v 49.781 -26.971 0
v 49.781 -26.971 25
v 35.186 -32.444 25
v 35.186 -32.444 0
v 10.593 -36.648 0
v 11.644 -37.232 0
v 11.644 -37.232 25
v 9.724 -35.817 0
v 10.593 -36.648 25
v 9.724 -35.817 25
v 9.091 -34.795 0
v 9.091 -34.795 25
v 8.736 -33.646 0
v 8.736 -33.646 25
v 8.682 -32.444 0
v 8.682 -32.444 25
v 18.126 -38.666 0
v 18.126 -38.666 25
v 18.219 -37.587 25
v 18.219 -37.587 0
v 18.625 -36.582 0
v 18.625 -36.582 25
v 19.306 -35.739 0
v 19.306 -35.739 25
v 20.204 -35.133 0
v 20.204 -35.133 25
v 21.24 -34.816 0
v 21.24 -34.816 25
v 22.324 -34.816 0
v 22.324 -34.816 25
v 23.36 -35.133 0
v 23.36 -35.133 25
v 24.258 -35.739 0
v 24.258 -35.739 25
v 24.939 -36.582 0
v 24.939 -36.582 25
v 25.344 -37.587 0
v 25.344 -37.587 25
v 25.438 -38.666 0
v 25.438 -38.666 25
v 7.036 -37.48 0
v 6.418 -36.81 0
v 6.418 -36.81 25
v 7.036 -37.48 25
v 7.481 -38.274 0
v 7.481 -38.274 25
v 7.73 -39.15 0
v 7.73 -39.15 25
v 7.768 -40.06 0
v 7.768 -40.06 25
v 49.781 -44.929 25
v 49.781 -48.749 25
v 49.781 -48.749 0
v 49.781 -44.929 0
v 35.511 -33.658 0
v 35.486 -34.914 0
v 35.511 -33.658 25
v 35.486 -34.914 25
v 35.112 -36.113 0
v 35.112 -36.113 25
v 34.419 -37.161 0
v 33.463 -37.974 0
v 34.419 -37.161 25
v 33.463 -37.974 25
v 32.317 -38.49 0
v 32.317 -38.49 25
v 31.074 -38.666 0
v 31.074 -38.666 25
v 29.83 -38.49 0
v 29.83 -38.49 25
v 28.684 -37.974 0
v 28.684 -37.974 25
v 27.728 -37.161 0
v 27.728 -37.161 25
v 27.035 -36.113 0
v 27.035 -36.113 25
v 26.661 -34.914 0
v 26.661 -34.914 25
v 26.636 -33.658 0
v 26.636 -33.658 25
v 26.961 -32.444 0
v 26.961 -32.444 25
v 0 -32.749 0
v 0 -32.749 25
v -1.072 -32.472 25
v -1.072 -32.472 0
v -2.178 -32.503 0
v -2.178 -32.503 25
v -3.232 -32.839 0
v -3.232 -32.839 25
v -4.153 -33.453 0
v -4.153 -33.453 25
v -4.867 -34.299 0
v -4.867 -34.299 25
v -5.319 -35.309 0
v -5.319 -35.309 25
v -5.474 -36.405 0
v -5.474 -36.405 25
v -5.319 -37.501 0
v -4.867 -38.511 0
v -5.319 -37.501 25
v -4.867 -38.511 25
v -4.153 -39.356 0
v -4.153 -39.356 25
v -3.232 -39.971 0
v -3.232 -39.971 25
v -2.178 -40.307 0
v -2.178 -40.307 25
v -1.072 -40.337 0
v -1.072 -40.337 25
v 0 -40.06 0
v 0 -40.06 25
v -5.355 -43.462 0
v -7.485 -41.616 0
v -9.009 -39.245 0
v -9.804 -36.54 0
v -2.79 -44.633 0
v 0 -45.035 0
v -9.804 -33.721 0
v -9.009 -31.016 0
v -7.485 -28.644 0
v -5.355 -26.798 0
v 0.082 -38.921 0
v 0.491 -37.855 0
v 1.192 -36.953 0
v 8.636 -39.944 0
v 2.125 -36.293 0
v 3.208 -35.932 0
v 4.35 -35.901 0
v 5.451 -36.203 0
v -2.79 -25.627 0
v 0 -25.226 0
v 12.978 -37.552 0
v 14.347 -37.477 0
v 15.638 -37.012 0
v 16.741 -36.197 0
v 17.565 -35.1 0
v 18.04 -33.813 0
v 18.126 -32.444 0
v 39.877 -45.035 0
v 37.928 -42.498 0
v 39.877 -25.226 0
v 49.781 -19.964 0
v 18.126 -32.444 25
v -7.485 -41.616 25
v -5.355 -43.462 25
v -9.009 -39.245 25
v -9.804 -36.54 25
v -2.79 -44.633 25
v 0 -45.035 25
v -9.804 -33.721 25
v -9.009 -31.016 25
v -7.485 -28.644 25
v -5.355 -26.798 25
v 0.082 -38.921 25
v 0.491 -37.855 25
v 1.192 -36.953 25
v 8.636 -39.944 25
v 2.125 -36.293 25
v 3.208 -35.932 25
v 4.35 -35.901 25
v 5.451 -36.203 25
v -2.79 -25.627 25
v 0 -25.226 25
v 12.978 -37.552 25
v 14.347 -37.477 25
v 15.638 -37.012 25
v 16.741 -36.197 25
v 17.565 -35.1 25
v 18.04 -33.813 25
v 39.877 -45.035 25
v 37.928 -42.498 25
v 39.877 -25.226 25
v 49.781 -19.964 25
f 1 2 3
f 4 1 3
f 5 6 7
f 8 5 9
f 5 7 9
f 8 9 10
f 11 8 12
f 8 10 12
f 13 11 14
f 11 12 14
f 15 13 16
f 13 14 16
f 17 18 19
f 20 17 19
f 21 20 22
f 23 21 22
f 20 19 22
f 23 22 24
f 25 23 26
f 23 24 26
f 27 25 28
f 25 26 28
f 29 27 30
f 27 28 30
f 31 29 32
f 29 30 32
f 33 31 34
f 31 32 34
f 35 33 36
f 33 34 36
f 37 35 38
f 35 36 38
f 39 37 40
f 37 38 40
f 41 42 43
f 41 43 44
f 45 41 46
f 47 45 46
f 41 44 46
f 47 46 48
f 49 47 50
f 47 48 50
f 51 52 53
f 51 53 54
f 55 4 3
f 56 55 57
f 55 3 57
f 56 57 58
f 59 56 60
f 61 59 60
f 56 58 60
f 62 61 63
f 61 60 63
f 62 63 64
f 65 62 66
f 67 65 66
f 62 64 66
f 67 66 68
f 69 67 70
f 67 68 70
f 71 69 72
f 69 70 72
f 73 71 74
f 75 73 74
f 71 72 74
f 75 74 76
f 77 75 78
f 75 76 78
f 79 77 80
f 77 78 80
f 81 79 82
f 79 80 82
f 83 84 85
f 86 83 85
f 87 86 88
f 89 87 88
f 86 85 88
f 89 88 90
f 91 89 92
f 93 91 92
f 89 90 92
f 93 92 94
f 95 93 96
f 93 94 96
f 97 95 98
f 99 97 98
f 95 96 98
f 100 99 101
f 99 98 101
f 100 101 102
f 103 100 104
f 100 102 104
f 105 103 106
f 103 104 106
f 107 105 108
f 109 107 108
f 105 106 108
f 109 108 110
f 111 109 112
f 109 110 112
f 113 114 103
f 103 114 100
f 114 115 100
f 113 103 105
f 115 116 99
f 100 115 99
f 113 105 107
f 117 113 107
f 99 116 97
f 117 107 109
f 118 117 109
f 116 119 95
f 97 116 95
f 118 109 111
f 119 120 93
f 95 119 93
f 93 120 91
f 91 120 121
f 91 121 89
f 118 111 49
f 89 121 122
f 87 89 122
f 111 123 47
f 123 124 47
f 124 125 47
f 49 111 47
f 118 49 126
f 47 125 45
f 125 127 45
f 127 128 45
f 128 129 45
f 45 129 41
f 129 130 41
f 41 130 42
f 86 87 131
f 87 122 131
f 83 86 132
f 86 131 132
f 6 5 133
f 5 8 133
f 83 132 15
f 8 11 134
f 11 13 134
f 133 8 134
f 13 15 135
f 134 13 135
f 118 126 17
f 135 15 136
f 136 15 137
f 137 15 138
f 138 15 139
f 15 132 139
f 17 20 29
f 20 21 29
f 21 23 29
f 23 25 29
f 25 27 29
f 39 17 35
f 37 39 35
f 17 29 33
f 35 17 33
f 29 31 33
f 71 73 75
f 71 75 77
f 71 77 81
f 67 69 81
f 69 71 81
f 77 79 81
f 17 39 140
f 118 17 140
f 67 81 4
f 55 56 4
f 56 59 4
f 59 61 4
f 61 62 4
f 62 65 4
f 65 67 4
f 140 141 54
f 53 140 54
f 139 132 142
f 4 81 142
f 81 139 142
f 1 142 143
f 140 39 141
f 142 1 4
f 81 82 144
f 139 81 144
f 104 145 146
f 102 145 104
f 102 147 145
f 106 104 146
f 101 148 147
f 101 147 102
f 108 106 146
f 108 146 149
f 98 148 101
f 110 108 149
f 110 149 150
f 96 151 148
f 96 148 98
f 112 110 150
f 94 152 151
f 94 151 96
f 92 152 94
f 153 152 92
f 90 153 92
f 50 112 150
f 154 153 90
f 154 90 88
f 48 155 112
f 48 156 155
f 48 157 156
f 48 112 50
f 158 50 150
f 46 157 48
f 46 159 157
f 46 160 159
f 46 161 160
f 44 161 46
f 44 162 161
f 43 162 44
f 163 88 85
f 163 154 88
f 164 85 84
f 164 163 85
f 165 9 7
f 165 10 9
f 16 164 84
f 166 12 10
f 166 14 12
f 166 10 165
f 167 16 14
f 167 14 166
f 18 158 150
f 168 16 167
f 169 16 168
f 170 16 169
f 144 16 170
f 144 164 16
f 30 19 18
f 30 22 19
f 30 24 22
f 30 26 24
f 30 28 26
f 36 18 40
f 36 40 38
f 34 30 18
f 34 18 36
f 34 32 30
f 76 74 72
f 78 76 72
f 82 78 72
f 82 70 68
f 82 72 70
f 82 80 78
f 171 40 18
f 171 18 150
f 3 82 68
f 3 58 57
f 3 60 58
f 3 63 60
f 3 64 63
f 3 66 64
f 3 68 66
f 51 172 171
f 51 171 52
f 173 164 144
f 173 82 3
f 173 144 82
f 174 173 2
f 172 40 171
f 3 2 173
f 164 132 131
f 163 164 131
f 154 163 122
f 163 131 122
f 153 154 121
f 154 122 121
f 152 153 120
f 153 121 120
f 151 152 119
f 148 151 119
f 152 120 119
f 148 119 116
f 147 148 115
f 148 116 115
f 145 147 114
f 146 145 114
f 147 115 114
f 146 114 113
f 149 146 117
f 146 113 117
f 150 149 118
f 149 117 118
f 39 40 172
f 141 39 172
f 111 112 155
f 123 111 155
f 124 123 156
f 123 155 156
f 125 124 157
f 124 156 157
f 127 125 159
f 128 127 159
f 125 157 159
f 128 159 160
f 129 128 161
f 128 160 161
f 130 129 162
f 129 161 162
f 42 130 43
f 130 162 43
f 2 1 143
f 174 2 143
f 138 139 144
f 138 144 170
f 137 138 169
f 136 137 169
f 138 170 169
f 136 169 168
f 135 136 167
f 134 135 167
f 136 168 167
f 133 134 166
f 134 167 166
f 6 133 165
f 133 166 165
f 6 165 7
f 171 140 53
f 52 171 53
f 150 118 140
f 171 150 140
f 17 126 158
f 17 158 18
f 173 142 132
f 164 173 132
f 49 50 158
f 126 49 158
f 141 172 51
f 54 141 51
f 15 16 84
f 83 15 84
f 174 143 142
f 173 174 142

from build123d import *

# Parameters (mm, degrees)
F1_DEPTH = 25
F4_DEPTH = 25
F5_DEPTH = 25


with BuildPart() as f1:
    # F0 (on Top) → F1 (new body)
    with BuildSketch(Plane.XY):
        with BuildLine():
            ThreePointArc((0, -25.2255909145), (-9.9045261741, -35.1301170886), (0, -45.0346432626))
            Line((0, -45.0346432626), (39.8768223822, -45.0346432626))
            Line((39.8768223822, -45.0346432626), (49.781344831, -48.7488396466))
            Line((49.781344831, -48.7488396466), (49.781344831, -19.9638102204))
            Line((49.781344831, -19.9638102204), (39.8768223822, -25.2255909145))
            Line((39.8768223822, -25.2255909145), (0, -25.2255909145))
        make_face()
    extrude(amount=F1_DEPTH)

    # F2 (on face) → F4 (join)
    with BuildSketch(Plane.XY.offset(25)):
        with BuildLine():
            Line((39.8768223822, -25.2255909145), (0, -25.2255909145))
            ThreePointArc((0, -25.2255909145), (-9.9045261741, -35.1301170886), (0, -45.0346432626))
            Line((0, -45.0346432626), (39.8768223822, -45.0346432626))
            Line((39.8768223822, -45.0346432626), (49.781344831, -48.7488396466))
            Line((49.781344831, -48.7488396466), (49.781344831, -19.9638102204))
            Line((49.781344831, -19.9638102204), (39.8768223822, -25.2255909145))
        make_face()
    extrude(amount=-F4_DEPTH)

    # F3 (on face) → F5 (cut)
    with BuildSketch(Plane.XY.offset(25)):
        with BuildLine():
            Line((8.6823031306, -32.4443913996), (0, -32.7490344644))
            ThreePointArc((0, -32.7490344644), (-5.4739792074, -36.4047400653), (0, -40.0604456663))
            ThreePointArc((0, -40.0604456663), (2.12452123, -36.2934819265), (6.4182874872, -36.8103741808))
            ThreePointArc((6.4182874872, -36.8103741808), (7.8913776241, -38.1191729594), (8.6357264586, -39.9436985434))
            Line((8.6357264586, -39.9436985434), (18.1262083352, -38.6662621896))
            ThreePointArc((18.1262083352, -38.6662621896), (21.7819157988, -34.7755161234), (25.4376232624, -38.6662621896))
            Line((25.4376232624, -38.6662621896), (37.927955389, -42.4975827336))
            Line((37.927955389, -42.4975827336), (49.781344831, -44.9290481875))
            Line((49.781344831, -44.9290481875), (49.781344831, -26.9712014124))
            Line((49.781344831, -26.9712014124), (35.1861715317, -32.4443913996))
            ThreePointArc((35.1861715317, -32.4443913996), (31.0735022649, -38.6662621896), (26.9608329982, -32.4443913996))
            Line((26.9608329982, -32.4443913996), (19.0401375294, -32.4443913996))
            ThreePointArc((19.0401375294, -32.4443913996), (16.6761777926, -36.8994118679), (11.6438215498, -37.2324338722))
            ThreePointArc((11.6438215498, -37.2324338722), (9.374780297, -35.3259838728), (8.6823031306, -32.4443913996))
        make_face()
        with BuildLine():
            ThreePointArc((8.6357264586, -39.9436985434), (7.8913776241, -38.1191729594), (6.4182874872, -36.8103741808))
            ThreePointArc((6.4182874872, -36.8103741808), (7.4813175027, -38.2742394866), (7.7683748677, -40.0604456663))
            Line((7.7683748677, -40.0604456663), (8.6357264586, -39.9436985434))
        make_face()
        with BuildLine():
            ThreePointArc((18.1262083352, -32.4443913996), (16.2192131955, -36.6447435476), (11.6438215498, -37.2324338722))
            ThreePointArc((11.6438215498, -37.2324338722), (16.6761777926, -36.8994118679), (19.0401375294, -32.4443913996))
            Line((19.0401375294, -32.4443913996), (18.1262083352, -32.4443913996))
        make_face()
    extrude(amount=-F5_DEPTH, mode=Mode.SUBTRACT)


solid = f1.part
